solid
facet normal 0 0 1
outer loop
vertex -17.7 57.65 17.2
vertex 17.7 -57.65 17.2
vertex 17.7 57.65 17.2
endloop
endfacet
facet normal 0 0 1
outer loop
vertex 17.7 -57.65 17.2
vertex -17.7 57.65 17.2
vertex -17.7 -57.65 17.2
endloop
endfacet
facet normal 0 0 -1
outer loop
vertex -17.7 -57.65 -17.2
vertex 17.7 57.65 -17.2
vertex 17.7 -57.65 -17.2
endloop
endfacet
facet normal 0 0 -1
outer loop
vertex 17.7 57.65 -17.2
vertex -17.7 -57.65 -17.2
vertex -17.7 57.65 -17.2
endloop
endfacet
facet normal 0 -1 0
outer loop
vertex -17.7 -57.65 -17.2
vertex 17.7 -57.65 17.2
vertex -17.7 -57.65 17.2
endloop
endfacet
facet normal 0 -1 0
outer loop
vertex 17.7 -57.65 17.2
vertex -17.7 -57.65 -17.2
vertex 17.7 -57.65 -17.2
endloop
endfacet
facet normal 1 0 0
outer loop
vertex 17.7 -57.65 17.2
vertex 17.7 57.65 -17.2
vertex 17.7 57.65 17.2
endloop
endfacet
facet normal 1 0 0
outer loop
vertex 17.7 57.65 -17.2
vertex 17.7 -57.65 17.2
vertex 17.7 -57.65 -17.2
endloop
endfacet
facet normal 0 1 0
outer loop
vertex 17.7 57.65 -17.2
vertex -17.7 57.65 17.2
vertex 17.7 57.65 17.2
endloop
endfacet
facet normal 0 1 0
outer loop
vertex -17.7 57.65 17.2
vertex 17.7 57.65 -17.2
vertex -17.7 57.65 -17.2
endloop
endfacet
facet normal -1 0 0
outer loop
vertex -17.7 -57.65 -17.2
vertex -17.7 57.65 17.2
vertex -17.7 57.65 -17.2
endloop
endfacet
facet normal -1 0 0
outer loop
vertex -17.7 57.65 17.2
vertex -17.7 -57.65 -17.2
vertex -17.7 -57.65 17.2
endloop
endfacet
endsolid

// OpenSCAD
$fn = 64;
BATTERY_WIDTH = 35.4;
BATTERY_DEPTH = 115.3;
BATTERY_HEIGHT = 34.4;

module battery(){
  /* Body */
  union(){
    cube([BATTERY_WIDTH, BATTERY_DEPTH, BATTERY_HEIGHT], true);
  }
}

battery();
